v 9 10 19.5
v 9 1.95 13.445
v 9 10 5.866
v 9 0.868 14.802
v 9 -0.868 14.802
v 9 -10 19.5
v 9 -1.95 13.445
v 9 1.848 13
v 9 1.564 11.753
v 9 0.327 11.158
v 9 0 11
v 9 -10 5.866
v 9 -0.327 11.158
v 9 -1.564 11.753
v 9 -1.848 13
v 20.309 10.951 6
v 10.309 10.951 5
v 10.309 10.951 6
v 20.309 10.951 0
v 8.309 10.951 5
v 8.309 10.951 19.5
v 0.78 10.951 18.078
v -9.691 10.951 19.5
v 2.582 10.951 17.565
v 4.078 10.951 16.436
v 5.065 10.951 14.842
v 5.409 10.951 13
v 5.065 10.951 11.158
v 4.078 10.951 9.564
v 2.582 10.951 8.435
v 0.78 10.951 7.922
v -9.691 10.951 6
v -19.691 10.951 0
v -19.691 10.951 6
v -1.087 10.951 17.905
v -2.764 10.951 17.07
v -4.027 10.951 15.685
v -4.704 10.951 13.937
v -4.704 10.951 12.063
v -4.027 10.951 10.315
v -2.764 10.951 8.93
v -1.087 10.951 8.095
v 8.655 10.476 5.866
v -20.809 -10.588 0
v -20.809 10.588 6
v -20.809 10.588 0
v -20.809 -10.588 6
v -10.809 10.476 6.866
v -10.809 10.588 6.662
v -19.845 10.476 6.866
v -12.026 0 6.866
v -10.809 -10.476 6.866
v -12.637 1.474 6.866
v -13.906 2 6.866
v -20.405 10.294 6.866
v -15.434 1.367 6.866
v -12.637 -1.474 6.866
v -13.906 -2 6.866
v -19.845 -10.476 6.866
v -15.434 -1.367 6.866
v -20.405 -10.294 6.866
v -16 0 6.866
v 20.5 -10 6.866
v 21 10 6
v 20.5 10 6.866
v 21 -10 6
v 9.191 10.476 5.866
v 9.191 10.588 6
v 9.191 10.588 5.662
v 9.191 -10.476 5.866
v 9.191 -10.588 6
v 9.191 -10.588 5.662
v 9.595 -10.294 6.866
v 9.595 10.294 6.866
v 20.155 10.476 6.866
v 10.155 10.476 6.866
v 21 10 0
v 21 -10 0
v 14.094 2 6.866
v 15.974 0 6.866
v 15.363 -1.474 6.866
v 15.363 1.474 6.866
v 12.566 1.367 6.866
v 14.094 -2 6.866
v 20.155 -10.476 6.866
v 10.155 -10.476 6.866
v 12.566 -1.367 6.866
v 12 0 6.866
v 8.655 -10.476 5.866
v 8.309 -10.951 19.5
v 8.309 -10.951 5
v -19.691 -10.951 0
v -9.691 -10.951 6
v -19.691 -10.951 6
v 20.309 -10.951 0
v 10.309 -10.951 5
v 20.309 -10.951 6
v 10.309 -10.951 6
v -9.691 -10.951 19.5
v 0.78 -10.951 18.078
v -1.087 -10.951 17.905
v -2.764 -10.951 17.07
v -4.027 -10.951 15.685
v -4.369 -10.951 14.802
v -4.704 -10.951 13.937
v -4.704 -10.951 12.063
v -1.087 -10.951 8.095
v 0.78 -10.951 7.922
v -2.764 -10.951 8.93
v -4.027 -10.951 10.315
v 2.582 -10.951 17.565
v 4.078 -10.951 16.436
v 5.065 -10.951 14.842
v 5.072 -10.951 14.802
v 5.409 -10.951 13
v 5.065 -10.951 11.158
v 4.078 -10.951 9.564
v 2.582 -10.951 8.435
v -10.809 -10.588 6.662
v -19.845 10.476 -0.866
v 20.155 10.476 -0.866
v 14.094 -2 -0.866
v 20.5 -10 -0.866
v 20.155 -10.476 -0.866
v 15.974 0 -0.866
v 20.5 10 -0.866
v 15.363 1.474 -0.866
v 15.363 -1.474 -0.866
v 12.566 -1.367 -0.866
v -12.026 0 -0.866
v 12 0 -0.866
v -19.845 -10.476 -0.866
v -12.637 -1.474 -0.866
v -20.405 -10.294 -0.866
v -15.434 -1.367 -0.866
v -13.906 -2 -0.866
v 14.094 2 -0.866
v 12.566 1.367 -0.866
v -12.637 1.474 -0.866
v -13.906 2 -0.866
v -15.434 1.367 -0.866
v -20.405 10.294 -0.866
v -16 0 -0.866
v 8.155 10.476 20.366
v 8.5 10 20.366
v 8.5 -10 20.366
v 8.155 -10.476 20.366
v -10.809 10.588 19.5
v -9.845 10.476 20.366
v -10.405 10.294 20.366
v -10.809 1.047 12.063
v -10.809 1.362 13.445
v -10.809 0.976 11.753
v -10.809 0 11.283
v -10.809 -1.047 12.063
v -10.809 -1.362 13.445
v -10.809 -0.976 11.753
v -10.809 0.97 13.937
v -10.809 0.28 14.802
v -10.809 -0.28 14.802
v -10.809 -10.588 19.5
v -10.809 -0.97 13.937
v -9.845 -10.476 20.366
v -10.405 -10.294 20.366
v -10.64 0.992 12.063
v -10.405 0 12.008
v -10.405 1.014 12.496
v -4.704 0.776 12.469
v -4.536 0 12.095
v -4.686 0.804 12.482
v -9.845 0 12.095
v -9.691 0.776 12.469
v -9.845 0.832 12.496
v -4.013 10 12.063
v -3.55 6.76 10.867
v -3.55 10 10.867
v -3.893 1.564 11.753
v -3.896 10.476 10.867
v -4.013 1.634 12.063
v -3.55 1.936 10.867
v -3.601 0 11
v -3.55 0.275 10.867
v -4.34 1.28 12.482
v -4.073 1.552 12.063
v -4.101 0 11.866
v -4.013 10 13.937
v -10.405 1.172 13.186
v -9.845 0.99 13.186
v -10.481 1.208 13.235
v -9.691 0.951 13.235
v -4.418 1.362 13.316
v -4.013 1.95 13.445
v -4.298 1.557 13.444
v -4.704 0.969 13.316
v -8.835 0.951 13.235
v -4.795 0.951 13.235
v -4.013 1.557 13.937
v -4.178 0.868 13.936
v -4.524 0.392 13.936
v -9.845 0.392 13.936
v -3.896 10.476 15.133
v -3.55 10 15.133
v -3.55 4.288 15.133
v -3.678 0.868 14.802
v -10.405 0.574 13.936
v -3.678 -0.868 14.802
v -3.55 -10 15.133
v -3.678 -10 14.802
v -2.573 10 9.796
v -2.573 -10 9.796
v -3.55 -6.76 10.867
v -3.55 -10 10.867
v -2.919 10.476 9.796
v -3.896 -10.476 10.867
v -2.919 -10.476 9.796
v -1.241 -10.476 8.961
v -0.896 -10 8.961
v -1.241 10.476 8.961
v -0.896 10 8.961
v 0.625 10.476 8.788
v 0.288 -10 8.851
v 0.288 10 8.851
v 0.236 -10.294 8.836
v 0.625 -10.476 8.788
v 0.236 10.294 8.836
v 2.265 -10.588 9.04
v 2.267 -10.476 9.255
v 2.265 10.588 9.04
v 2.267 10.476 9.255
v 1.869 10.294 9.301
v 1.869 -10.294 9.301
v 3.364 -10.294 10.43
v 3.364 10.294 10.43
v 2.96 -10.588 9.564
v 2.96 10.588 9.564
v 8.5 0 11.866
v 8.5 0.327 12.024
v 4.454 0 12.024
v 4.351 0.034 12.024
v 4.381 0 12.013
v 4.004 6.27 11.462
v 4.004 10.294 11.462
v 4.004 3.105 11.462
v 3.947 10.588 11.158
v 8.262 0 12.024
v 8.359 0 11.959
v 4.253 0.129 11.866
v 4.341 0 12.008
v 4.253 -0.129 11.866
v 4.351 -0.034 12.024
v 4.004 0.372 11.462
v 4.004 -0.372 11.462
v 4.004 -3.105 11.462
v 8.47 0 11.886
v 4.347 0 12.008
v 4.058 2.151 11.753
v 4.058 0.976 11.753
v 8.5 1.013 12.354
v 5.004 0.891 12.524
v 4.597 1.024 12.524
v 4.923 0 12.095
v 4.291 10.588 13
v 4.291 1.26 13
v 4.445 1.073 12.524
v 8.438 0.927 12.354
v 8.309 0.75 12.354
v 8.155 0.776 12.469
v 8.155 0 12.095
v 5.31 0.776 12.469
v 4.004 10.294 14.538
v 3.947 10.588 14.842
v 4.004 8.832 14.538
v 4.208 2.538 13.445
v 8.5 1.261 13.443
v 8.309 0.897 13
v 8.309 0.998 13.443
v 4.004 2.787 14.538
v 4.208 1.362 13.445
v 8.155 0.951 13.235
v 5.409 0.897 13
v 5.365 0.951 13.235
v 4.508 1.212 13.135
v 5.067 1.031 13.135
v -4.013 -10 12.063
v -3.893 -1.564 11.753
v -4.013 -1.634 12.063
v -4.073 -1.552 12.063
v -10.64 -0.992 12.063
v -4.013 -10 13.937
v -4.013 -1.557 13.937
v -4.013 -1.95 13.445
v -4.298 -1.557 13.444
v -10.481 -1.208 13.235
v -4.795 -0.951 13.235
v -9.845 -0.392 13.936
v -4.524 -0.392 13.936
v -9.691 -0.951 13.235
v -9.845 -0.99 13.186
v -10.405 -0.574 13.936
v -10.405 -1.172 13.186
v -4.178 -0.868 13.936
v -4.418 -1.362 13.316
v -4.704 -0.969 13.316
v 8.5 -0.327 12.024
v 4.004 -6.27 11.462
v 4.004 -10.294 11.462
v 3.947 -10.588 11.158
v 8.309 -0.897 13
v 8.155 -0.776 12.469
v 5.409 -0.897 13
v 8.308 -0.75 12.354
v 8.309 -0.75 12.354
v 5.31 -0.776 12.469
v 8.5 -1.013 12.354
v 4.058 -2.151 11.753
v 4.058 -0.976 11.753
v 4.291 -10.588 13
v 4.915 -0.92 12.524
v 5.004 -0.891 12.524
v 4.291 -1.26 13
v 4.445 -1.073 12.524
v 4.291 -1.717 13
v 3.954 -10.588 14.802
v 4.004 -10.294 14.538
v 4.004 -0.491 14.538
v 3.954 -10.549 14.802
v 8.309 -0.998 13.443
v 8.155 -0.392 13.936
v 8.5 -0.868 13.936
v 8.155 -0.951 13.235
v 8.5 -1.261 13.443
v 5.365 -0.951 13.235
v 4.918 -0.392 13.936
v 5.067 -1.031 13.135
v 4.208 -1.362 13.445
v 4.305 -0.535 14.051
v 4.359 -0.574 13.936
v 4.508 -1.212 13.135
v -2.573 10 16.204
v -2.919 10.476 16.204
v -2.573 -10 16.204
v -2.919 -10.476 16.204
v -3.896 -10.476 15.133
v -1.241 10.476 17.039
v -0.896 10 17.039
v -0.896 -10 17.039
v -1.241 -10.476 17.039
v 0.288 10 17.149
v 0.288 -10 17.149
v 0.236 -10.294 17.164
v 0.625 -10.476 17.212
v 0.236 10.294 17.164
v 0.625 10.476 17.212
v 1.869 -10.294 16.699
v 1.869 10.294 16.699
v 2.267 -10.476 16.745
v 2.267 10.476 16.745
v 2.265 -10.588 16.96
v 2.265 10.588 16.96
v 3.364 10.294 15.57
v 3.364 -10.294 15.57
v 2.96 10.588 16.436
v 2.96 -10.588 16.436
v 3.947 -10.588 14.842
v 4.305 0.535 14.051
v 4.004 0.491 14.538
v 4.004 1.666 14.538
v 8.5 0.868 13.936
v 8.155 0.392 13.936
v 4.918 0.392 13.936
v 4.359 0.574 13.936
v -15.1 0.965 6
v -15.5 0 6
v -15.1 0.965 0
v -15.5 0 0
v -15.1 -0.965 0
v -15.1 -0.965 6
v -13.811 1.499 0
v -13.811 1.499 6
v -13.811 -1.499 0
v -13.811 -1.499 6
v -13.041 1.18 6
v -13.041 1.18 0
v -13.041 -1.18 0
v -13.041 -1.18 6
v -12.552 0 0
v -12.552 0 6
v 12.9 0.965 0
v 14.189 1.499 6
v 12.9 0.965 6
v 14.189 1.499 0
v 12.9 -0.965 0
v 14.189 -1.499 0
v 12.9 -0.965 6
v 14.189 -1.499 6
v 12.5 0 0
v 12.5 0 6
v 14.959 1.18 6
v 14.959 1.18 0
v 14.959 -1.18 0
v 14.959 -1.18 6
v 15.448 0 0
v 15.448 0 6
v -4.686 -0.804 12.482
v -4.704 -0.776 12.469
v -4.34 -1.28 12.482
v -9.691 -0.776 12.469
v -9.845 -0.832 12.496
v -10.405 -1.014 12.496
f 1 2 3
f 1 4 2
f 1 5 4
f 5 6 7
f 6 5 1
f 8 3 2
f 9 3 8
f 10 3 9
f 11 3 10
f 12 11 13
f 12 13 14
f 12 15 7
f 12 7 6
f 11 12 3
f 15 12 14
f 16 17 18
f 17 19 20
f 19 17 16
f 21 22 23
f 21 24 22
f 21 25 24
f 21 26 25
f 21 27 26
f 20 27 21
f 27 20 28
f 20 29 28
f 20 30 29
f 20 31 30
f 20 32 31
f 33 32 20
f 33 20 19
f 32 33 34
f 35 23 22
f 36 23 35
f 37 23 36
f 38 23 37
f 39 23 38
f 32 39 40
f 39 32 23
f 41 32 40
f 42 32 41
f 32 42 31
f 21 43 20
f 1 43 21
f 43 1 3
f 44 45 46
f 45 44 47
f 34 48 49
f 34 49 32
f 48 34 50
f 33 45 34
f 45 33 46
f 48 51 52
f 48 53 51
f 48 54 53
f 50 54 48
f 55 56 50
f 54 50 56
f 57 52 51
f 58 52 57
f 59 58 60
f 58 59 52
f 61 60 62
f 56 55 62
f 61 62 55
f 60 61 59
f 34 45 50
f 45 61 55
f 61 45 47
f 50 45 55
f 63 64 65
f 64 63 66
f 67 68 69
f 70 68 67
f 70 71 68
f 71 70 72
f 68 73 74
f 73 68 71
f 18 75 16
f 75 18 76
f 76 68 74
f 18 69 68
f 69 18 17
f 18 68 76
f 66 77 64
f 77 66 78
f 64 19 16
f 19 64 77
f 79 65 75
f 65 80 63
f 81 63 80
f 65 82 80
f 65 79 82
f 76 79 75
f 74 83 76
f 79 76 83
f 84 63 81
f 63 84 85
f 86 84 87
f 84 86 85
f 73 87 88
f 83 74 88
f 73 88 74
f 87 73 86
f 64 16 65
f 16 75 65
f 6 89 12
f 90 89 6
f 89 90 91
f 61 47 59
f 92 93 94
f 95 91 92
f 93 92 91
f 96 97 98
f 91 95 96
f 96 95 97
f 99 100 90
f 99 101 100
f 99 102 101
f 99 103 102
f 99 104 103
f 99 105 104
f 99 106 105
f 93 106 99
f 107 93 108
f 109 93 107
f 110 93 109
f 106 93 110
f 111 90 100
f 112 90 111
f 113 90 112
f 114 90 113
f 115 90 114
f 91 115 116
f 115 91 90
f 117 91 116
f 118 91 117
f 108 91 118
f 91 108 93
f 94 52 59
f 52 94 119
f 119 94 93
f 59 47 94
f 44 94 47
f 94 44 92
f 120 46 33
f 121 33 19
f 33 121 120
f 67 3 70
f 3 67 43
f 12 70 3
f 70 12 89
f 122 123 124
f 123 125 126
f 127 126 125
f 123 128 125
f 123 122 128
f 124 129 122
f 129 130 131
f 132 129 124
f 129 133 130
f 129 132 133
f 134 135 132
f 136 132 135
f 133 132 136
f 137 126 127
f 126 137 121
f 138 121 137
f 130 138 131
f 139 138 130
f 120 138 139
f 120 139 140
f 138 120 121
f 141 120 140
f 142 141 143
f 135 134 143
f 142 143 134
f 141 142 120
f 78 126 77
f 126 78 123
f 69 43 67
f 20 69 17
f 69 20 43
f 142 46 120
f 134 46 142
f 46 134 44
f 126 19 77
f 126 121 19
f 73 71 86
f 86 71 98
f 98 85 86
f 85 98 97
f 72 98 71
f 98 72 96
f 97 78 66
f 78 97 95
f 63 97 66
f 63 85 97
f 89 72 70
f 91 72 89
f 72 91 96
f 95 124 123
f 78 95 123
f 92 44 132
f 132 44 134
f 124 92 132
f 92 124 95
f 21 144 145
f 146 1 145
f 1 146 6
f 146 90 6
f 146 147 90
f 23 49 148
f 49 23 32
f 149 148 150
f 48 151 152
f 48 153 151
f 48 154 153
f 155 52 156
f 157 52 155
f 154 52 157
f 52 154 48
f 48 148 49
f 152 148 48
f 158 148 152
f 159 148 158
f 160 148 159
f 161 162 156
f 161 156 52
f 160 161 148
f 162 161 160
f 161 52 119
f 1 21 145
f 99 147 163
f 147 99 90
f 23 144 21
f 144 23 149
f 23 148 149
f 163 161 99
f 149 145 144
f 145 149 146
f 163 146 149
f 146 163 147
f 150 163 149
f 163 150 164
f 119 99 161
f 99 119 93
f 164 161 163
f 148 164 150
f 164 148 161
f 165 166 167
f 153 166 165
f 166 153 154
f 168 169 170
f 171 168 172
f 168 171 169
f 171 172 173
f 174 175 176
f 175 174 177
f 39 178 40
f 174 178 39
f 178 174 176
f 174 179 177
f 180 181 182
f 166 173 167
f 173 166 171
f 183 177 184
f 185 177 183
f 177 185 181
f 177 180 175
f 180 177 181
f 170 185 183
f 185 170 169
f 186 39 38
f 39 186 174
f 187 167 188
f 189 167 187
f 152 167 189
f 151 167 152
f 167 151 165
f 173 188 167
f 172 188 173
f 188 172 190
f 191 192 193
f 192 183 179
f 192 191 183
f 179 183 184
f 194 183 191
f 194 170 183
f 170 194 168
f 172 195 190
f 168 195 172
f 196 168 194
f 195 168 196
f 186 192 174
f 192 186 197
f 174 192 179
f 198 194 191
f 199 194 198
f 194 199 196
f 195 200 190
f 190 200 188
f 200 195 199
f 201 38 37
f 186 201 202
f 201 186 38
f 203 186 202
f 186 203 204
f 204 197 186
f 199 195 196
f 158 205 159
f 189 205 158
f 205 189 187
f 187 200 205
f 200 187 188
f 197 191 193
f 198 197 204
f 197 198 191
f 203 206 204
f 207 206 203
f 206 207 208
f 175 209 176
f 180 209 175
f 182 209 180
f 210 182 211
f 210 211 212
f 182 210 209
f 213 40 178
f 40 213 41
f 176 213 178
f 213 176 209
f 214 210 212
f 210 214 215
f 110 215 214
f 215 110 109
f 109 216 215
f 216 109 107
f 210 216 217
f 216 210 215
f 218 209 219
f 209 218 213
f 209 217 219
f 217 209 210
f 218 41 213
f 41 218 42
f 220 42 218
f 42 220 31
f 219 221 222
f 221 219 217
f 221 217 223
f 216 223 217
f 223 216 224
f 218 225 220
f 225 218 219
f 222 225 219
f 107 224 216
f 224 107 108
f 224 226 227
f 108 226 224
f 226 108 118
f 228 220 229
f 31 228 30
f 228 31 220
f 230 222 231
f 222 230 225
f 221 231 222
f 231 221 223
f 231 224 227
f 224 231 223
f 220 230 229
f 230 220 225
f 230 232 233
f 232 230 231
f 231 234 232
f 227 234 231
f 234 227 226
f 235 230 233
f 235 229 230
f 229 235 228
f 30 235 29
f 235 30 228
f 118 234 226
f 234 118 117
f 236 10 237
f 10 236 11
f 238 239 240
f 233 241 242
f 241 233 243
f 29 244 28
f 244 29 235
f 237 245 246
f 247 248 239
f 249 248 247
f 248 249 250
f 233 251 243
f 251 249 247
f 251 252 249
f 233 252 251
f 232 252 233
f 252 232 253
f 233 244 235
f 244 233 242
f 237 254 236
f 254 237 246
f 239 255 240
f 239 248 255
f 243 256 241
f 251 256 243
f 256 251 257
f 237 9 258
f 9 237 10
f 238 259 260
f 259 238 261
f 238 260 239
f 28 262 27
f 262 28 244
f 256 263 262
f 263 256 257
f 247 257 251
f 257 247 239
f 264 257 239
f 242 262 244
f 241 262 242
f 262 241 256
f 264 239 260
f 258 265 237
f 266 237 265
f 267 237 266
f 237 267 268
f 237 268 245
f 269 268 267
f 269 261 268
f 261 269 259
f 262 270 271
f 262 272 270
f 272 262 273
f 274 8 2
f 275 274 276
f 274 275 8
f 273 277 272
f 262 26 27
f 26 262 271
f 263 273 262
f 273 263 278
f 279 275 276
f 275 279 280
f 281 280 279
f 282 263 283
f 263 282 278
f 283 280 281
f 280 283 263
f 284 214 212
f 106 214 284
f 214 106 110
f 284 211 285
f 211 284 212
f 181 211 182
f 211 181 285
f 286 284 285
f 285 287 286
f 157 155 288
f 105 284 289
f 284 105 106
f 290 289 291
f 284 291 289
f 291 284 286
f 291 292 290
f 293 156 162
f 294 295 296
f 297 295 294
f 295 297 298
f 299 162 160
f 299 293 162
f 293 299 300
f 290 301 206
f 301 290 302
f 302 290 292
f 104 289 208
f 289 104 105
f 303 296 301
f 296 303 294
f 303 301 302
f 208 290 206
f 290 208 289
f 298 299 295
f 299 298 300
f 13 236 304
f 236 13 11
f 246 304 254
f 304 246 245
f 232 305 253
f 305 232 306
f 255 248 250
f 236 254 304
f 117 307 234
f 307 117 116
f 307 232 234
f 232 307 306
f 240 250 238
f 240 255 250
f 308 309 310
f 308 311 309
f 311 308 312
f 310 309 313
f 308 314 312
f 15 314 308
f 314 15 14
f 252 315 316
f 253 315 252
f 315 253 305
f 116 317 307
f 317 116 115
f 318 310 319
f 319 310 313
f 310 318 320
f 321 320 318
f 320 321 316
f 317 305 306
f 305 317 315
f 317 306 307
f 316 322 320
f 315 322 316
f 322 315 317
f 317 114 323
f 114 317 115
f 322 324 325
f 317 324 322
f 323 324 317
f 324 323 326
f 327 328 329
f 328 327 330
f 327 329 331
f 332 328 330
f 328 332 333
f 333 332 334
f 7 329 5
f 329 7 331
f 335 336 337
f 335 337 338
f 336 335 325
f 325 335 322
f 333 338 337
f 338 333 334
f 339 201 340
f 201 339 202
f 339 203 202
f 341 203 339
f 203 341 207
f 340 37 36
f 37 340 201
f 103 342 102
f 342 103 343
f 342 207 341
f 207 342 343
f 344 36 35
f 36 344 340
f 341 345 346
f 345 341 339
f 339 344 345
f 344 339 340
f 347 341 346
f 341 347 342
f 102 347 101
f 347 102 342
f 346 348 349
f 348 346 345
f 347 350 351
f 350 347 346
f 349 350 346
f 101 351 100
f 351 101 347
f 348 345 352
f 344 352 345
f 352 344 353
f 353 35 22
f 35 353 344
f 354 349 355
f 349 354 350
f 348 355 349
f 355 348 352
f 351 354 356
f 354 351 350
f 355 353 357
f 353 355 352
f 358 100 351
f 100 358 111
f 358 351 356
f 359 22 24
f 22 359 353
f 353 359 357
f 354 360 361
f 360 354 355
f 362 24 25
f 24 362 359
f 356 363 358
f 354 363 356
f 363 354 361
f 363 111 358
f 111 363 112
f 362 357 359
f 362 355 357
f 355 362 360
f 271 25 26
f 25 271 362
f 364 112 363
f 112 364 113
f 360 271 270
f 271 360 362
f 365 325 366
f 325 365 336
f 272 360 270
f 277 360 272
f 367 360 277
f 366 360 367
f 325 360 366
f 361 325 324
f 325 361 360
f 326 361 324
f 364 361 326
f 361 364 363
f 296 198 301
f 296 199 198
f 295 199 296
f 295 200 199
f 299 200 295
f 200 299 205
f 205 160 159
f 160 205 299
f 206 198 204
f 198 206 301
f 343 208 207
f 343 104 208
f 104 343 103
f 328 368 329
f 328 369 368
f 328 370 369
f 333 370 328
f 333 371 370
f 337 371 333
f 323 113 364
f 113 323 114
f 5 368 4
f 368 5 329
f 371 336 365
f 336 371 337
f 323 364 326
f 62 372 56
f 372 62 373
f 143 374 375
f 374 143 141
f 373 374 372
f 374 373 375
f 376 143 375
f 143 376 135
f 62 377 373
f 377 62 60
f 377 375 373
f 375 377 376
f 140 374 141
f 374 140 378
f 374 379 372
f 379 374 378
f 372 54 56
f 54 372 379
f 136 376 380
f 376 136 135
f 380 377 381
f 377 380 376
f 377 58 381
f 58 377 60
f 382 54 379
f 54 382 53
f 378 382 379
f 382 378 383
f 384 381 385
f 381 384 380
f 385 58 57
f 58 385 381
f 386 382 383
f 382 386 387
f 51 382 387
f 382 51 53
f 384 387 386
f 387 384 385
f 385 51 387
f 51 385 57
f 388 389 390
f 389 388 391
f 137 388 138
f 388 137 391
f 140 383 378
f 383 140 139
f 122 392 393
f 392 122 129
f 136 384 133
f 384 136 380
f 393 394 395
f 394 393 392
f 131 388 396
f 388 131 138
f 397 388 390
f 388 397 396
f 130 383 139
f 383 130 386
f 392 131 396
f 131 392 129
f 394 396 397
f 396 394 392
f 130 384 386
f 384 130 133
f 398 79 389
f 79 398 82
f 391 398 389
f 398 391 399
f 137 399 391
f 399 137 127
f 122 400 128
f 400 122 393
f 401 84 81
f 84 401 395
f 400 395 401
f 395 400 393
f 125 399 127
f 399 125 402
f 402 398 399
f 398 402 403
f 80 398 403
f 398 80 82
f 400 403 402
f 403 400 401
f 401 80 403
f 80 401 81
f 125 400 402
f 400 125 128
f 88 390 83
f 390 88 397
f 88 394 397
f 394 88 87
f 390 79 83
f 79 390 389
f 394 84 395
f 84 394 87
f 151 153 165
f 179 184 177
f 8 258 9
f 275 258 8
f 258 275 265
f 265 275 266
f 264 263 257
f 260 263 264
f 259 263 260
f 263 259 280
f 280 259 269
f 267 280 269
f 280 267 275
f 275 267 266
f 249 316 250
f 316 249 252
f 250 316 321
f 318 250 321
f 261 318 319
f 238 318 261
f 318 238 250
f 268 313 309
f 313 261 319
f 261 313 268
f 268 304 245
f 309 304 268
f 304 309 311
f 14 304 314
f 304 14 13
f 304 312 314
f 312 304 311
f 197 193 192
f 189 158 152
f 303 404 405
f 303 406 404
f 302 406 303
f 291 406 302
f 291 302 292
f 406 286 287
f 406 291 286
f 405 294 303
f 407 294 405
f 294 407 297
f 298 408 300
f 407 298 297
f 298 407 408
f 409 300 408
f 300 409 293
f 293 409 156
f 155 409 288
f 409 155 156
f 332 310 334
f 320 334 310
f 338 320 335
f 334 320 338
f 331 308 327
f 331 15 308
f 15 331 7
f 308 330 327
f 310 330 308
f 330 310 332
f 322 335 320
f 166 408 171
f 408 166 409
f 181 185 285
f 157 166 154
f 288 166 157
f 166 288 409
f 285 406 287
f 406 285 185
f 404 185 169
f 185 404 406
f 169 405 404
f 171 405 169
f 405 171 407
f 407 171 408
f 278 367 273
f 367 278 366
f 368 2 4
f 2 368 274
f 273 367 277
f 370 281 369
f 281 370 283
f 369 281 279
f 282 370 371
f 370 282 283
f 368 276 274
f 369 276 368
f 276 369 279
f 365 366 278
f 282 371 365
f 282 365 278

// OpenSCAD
// Parameters
rod_d = 10.0; //[5.0:20.0:0.1]
bore_clearance = 0.2; //[0.0:1.0:0.05]
bracket_h = 20.0; //[10.0:40.0:0.5]
base_L = 40.0; //[20.0:80.0:1]
base_W = 20.0; //[10.0:40.0:1]
base_T = 6.0; //[3.0:12.0:0.5]
support_block_L = 20.0; //[10.0:40.0:1]
support_block_W = 20.0; //[10.0:40.0:1]
mount_hole_d = 5.0; //[3.0:10.0:0.1]
mount_hole_spacing = 28.0; //[14.0:56.0:0.5]
overlap = 1.0; //[0.5:2.0:0.1]
slot_w = 2.0; //[1.0:4.0:0.1]
set_screw_d = 4.0; //[2.0:8.0:0.1]
fillet_r = 1.0; //[0.5:3.0:0.1]

// Base block
module base_block() {
  translate([0, 0, base_T/2])
    cube([base_L, base_W, base_T], center=true);
}

// Support block
module support_block() {
  translate([0, 0, base_T + (bracket_h - base_T)/2 - overlap/2])
    cube([support_block_L, support_block_W, bracket_h - base_T], center=true);
}

// Rod support bore
module rod_support_bore() {
  translate([0, 0, base_T + (bracket_h - base_T)/2])
    rotate([90, 0, 0])
      cylinder(h=support_block_W + 2*overlap, r=(rod_d + bore_clearance)/2, center=true);
}

// Mounting holes
module mount_hole_1() {
  translate([-mount_hole_spacing/2, 0, base_T/2])
    cylinder(h=base_T + 2*overlap, r=mount_hole_d/2, center=true);
}

module mount_hole_2() {
  translate([mount_hole_spacing/2, 0, base_T/2])
    cylinder(h=base_T + 2*overlap, r=mount_hole_d/2, center=true);
}

// Set screw hole
module set_screw_hole() {
  translate([0, 0, base_T + (bracket_h - base_T)/2])
    rotate([0, 90, 0])
      cylinder(h=support_block_L + 2*overlap, r=set_screw_d/2, center=true);
}

// Split clamp slot
module split_clamp_slot() {
  translate([support_block_L/2 - slot_w/2, 0, base_T + (bracket_h - base_T)/2])
    cube([slot_w, support_block_W + 2*overlap, bracket_h - base_T + 2*overlap], center=true);
}

// Fillets and chamfers sphere
module fillets_chamfers_sphere() {
  sphere(r=fillet_r, center=true);
}

// Assemble bracket
module bracket() {
  difference() {
    union() {
      base_block();
      support_block();
    }
    rod_support_bore();
    union() {
      mount_hole_1();
      mount_hole_2();
    }
    set_screw_hole();
    split_clamp_slot();
  }
}

// Final output with fillets and chamfers
minkowski() {
  bracket();
  fillets_chamfers_sphere();
}
